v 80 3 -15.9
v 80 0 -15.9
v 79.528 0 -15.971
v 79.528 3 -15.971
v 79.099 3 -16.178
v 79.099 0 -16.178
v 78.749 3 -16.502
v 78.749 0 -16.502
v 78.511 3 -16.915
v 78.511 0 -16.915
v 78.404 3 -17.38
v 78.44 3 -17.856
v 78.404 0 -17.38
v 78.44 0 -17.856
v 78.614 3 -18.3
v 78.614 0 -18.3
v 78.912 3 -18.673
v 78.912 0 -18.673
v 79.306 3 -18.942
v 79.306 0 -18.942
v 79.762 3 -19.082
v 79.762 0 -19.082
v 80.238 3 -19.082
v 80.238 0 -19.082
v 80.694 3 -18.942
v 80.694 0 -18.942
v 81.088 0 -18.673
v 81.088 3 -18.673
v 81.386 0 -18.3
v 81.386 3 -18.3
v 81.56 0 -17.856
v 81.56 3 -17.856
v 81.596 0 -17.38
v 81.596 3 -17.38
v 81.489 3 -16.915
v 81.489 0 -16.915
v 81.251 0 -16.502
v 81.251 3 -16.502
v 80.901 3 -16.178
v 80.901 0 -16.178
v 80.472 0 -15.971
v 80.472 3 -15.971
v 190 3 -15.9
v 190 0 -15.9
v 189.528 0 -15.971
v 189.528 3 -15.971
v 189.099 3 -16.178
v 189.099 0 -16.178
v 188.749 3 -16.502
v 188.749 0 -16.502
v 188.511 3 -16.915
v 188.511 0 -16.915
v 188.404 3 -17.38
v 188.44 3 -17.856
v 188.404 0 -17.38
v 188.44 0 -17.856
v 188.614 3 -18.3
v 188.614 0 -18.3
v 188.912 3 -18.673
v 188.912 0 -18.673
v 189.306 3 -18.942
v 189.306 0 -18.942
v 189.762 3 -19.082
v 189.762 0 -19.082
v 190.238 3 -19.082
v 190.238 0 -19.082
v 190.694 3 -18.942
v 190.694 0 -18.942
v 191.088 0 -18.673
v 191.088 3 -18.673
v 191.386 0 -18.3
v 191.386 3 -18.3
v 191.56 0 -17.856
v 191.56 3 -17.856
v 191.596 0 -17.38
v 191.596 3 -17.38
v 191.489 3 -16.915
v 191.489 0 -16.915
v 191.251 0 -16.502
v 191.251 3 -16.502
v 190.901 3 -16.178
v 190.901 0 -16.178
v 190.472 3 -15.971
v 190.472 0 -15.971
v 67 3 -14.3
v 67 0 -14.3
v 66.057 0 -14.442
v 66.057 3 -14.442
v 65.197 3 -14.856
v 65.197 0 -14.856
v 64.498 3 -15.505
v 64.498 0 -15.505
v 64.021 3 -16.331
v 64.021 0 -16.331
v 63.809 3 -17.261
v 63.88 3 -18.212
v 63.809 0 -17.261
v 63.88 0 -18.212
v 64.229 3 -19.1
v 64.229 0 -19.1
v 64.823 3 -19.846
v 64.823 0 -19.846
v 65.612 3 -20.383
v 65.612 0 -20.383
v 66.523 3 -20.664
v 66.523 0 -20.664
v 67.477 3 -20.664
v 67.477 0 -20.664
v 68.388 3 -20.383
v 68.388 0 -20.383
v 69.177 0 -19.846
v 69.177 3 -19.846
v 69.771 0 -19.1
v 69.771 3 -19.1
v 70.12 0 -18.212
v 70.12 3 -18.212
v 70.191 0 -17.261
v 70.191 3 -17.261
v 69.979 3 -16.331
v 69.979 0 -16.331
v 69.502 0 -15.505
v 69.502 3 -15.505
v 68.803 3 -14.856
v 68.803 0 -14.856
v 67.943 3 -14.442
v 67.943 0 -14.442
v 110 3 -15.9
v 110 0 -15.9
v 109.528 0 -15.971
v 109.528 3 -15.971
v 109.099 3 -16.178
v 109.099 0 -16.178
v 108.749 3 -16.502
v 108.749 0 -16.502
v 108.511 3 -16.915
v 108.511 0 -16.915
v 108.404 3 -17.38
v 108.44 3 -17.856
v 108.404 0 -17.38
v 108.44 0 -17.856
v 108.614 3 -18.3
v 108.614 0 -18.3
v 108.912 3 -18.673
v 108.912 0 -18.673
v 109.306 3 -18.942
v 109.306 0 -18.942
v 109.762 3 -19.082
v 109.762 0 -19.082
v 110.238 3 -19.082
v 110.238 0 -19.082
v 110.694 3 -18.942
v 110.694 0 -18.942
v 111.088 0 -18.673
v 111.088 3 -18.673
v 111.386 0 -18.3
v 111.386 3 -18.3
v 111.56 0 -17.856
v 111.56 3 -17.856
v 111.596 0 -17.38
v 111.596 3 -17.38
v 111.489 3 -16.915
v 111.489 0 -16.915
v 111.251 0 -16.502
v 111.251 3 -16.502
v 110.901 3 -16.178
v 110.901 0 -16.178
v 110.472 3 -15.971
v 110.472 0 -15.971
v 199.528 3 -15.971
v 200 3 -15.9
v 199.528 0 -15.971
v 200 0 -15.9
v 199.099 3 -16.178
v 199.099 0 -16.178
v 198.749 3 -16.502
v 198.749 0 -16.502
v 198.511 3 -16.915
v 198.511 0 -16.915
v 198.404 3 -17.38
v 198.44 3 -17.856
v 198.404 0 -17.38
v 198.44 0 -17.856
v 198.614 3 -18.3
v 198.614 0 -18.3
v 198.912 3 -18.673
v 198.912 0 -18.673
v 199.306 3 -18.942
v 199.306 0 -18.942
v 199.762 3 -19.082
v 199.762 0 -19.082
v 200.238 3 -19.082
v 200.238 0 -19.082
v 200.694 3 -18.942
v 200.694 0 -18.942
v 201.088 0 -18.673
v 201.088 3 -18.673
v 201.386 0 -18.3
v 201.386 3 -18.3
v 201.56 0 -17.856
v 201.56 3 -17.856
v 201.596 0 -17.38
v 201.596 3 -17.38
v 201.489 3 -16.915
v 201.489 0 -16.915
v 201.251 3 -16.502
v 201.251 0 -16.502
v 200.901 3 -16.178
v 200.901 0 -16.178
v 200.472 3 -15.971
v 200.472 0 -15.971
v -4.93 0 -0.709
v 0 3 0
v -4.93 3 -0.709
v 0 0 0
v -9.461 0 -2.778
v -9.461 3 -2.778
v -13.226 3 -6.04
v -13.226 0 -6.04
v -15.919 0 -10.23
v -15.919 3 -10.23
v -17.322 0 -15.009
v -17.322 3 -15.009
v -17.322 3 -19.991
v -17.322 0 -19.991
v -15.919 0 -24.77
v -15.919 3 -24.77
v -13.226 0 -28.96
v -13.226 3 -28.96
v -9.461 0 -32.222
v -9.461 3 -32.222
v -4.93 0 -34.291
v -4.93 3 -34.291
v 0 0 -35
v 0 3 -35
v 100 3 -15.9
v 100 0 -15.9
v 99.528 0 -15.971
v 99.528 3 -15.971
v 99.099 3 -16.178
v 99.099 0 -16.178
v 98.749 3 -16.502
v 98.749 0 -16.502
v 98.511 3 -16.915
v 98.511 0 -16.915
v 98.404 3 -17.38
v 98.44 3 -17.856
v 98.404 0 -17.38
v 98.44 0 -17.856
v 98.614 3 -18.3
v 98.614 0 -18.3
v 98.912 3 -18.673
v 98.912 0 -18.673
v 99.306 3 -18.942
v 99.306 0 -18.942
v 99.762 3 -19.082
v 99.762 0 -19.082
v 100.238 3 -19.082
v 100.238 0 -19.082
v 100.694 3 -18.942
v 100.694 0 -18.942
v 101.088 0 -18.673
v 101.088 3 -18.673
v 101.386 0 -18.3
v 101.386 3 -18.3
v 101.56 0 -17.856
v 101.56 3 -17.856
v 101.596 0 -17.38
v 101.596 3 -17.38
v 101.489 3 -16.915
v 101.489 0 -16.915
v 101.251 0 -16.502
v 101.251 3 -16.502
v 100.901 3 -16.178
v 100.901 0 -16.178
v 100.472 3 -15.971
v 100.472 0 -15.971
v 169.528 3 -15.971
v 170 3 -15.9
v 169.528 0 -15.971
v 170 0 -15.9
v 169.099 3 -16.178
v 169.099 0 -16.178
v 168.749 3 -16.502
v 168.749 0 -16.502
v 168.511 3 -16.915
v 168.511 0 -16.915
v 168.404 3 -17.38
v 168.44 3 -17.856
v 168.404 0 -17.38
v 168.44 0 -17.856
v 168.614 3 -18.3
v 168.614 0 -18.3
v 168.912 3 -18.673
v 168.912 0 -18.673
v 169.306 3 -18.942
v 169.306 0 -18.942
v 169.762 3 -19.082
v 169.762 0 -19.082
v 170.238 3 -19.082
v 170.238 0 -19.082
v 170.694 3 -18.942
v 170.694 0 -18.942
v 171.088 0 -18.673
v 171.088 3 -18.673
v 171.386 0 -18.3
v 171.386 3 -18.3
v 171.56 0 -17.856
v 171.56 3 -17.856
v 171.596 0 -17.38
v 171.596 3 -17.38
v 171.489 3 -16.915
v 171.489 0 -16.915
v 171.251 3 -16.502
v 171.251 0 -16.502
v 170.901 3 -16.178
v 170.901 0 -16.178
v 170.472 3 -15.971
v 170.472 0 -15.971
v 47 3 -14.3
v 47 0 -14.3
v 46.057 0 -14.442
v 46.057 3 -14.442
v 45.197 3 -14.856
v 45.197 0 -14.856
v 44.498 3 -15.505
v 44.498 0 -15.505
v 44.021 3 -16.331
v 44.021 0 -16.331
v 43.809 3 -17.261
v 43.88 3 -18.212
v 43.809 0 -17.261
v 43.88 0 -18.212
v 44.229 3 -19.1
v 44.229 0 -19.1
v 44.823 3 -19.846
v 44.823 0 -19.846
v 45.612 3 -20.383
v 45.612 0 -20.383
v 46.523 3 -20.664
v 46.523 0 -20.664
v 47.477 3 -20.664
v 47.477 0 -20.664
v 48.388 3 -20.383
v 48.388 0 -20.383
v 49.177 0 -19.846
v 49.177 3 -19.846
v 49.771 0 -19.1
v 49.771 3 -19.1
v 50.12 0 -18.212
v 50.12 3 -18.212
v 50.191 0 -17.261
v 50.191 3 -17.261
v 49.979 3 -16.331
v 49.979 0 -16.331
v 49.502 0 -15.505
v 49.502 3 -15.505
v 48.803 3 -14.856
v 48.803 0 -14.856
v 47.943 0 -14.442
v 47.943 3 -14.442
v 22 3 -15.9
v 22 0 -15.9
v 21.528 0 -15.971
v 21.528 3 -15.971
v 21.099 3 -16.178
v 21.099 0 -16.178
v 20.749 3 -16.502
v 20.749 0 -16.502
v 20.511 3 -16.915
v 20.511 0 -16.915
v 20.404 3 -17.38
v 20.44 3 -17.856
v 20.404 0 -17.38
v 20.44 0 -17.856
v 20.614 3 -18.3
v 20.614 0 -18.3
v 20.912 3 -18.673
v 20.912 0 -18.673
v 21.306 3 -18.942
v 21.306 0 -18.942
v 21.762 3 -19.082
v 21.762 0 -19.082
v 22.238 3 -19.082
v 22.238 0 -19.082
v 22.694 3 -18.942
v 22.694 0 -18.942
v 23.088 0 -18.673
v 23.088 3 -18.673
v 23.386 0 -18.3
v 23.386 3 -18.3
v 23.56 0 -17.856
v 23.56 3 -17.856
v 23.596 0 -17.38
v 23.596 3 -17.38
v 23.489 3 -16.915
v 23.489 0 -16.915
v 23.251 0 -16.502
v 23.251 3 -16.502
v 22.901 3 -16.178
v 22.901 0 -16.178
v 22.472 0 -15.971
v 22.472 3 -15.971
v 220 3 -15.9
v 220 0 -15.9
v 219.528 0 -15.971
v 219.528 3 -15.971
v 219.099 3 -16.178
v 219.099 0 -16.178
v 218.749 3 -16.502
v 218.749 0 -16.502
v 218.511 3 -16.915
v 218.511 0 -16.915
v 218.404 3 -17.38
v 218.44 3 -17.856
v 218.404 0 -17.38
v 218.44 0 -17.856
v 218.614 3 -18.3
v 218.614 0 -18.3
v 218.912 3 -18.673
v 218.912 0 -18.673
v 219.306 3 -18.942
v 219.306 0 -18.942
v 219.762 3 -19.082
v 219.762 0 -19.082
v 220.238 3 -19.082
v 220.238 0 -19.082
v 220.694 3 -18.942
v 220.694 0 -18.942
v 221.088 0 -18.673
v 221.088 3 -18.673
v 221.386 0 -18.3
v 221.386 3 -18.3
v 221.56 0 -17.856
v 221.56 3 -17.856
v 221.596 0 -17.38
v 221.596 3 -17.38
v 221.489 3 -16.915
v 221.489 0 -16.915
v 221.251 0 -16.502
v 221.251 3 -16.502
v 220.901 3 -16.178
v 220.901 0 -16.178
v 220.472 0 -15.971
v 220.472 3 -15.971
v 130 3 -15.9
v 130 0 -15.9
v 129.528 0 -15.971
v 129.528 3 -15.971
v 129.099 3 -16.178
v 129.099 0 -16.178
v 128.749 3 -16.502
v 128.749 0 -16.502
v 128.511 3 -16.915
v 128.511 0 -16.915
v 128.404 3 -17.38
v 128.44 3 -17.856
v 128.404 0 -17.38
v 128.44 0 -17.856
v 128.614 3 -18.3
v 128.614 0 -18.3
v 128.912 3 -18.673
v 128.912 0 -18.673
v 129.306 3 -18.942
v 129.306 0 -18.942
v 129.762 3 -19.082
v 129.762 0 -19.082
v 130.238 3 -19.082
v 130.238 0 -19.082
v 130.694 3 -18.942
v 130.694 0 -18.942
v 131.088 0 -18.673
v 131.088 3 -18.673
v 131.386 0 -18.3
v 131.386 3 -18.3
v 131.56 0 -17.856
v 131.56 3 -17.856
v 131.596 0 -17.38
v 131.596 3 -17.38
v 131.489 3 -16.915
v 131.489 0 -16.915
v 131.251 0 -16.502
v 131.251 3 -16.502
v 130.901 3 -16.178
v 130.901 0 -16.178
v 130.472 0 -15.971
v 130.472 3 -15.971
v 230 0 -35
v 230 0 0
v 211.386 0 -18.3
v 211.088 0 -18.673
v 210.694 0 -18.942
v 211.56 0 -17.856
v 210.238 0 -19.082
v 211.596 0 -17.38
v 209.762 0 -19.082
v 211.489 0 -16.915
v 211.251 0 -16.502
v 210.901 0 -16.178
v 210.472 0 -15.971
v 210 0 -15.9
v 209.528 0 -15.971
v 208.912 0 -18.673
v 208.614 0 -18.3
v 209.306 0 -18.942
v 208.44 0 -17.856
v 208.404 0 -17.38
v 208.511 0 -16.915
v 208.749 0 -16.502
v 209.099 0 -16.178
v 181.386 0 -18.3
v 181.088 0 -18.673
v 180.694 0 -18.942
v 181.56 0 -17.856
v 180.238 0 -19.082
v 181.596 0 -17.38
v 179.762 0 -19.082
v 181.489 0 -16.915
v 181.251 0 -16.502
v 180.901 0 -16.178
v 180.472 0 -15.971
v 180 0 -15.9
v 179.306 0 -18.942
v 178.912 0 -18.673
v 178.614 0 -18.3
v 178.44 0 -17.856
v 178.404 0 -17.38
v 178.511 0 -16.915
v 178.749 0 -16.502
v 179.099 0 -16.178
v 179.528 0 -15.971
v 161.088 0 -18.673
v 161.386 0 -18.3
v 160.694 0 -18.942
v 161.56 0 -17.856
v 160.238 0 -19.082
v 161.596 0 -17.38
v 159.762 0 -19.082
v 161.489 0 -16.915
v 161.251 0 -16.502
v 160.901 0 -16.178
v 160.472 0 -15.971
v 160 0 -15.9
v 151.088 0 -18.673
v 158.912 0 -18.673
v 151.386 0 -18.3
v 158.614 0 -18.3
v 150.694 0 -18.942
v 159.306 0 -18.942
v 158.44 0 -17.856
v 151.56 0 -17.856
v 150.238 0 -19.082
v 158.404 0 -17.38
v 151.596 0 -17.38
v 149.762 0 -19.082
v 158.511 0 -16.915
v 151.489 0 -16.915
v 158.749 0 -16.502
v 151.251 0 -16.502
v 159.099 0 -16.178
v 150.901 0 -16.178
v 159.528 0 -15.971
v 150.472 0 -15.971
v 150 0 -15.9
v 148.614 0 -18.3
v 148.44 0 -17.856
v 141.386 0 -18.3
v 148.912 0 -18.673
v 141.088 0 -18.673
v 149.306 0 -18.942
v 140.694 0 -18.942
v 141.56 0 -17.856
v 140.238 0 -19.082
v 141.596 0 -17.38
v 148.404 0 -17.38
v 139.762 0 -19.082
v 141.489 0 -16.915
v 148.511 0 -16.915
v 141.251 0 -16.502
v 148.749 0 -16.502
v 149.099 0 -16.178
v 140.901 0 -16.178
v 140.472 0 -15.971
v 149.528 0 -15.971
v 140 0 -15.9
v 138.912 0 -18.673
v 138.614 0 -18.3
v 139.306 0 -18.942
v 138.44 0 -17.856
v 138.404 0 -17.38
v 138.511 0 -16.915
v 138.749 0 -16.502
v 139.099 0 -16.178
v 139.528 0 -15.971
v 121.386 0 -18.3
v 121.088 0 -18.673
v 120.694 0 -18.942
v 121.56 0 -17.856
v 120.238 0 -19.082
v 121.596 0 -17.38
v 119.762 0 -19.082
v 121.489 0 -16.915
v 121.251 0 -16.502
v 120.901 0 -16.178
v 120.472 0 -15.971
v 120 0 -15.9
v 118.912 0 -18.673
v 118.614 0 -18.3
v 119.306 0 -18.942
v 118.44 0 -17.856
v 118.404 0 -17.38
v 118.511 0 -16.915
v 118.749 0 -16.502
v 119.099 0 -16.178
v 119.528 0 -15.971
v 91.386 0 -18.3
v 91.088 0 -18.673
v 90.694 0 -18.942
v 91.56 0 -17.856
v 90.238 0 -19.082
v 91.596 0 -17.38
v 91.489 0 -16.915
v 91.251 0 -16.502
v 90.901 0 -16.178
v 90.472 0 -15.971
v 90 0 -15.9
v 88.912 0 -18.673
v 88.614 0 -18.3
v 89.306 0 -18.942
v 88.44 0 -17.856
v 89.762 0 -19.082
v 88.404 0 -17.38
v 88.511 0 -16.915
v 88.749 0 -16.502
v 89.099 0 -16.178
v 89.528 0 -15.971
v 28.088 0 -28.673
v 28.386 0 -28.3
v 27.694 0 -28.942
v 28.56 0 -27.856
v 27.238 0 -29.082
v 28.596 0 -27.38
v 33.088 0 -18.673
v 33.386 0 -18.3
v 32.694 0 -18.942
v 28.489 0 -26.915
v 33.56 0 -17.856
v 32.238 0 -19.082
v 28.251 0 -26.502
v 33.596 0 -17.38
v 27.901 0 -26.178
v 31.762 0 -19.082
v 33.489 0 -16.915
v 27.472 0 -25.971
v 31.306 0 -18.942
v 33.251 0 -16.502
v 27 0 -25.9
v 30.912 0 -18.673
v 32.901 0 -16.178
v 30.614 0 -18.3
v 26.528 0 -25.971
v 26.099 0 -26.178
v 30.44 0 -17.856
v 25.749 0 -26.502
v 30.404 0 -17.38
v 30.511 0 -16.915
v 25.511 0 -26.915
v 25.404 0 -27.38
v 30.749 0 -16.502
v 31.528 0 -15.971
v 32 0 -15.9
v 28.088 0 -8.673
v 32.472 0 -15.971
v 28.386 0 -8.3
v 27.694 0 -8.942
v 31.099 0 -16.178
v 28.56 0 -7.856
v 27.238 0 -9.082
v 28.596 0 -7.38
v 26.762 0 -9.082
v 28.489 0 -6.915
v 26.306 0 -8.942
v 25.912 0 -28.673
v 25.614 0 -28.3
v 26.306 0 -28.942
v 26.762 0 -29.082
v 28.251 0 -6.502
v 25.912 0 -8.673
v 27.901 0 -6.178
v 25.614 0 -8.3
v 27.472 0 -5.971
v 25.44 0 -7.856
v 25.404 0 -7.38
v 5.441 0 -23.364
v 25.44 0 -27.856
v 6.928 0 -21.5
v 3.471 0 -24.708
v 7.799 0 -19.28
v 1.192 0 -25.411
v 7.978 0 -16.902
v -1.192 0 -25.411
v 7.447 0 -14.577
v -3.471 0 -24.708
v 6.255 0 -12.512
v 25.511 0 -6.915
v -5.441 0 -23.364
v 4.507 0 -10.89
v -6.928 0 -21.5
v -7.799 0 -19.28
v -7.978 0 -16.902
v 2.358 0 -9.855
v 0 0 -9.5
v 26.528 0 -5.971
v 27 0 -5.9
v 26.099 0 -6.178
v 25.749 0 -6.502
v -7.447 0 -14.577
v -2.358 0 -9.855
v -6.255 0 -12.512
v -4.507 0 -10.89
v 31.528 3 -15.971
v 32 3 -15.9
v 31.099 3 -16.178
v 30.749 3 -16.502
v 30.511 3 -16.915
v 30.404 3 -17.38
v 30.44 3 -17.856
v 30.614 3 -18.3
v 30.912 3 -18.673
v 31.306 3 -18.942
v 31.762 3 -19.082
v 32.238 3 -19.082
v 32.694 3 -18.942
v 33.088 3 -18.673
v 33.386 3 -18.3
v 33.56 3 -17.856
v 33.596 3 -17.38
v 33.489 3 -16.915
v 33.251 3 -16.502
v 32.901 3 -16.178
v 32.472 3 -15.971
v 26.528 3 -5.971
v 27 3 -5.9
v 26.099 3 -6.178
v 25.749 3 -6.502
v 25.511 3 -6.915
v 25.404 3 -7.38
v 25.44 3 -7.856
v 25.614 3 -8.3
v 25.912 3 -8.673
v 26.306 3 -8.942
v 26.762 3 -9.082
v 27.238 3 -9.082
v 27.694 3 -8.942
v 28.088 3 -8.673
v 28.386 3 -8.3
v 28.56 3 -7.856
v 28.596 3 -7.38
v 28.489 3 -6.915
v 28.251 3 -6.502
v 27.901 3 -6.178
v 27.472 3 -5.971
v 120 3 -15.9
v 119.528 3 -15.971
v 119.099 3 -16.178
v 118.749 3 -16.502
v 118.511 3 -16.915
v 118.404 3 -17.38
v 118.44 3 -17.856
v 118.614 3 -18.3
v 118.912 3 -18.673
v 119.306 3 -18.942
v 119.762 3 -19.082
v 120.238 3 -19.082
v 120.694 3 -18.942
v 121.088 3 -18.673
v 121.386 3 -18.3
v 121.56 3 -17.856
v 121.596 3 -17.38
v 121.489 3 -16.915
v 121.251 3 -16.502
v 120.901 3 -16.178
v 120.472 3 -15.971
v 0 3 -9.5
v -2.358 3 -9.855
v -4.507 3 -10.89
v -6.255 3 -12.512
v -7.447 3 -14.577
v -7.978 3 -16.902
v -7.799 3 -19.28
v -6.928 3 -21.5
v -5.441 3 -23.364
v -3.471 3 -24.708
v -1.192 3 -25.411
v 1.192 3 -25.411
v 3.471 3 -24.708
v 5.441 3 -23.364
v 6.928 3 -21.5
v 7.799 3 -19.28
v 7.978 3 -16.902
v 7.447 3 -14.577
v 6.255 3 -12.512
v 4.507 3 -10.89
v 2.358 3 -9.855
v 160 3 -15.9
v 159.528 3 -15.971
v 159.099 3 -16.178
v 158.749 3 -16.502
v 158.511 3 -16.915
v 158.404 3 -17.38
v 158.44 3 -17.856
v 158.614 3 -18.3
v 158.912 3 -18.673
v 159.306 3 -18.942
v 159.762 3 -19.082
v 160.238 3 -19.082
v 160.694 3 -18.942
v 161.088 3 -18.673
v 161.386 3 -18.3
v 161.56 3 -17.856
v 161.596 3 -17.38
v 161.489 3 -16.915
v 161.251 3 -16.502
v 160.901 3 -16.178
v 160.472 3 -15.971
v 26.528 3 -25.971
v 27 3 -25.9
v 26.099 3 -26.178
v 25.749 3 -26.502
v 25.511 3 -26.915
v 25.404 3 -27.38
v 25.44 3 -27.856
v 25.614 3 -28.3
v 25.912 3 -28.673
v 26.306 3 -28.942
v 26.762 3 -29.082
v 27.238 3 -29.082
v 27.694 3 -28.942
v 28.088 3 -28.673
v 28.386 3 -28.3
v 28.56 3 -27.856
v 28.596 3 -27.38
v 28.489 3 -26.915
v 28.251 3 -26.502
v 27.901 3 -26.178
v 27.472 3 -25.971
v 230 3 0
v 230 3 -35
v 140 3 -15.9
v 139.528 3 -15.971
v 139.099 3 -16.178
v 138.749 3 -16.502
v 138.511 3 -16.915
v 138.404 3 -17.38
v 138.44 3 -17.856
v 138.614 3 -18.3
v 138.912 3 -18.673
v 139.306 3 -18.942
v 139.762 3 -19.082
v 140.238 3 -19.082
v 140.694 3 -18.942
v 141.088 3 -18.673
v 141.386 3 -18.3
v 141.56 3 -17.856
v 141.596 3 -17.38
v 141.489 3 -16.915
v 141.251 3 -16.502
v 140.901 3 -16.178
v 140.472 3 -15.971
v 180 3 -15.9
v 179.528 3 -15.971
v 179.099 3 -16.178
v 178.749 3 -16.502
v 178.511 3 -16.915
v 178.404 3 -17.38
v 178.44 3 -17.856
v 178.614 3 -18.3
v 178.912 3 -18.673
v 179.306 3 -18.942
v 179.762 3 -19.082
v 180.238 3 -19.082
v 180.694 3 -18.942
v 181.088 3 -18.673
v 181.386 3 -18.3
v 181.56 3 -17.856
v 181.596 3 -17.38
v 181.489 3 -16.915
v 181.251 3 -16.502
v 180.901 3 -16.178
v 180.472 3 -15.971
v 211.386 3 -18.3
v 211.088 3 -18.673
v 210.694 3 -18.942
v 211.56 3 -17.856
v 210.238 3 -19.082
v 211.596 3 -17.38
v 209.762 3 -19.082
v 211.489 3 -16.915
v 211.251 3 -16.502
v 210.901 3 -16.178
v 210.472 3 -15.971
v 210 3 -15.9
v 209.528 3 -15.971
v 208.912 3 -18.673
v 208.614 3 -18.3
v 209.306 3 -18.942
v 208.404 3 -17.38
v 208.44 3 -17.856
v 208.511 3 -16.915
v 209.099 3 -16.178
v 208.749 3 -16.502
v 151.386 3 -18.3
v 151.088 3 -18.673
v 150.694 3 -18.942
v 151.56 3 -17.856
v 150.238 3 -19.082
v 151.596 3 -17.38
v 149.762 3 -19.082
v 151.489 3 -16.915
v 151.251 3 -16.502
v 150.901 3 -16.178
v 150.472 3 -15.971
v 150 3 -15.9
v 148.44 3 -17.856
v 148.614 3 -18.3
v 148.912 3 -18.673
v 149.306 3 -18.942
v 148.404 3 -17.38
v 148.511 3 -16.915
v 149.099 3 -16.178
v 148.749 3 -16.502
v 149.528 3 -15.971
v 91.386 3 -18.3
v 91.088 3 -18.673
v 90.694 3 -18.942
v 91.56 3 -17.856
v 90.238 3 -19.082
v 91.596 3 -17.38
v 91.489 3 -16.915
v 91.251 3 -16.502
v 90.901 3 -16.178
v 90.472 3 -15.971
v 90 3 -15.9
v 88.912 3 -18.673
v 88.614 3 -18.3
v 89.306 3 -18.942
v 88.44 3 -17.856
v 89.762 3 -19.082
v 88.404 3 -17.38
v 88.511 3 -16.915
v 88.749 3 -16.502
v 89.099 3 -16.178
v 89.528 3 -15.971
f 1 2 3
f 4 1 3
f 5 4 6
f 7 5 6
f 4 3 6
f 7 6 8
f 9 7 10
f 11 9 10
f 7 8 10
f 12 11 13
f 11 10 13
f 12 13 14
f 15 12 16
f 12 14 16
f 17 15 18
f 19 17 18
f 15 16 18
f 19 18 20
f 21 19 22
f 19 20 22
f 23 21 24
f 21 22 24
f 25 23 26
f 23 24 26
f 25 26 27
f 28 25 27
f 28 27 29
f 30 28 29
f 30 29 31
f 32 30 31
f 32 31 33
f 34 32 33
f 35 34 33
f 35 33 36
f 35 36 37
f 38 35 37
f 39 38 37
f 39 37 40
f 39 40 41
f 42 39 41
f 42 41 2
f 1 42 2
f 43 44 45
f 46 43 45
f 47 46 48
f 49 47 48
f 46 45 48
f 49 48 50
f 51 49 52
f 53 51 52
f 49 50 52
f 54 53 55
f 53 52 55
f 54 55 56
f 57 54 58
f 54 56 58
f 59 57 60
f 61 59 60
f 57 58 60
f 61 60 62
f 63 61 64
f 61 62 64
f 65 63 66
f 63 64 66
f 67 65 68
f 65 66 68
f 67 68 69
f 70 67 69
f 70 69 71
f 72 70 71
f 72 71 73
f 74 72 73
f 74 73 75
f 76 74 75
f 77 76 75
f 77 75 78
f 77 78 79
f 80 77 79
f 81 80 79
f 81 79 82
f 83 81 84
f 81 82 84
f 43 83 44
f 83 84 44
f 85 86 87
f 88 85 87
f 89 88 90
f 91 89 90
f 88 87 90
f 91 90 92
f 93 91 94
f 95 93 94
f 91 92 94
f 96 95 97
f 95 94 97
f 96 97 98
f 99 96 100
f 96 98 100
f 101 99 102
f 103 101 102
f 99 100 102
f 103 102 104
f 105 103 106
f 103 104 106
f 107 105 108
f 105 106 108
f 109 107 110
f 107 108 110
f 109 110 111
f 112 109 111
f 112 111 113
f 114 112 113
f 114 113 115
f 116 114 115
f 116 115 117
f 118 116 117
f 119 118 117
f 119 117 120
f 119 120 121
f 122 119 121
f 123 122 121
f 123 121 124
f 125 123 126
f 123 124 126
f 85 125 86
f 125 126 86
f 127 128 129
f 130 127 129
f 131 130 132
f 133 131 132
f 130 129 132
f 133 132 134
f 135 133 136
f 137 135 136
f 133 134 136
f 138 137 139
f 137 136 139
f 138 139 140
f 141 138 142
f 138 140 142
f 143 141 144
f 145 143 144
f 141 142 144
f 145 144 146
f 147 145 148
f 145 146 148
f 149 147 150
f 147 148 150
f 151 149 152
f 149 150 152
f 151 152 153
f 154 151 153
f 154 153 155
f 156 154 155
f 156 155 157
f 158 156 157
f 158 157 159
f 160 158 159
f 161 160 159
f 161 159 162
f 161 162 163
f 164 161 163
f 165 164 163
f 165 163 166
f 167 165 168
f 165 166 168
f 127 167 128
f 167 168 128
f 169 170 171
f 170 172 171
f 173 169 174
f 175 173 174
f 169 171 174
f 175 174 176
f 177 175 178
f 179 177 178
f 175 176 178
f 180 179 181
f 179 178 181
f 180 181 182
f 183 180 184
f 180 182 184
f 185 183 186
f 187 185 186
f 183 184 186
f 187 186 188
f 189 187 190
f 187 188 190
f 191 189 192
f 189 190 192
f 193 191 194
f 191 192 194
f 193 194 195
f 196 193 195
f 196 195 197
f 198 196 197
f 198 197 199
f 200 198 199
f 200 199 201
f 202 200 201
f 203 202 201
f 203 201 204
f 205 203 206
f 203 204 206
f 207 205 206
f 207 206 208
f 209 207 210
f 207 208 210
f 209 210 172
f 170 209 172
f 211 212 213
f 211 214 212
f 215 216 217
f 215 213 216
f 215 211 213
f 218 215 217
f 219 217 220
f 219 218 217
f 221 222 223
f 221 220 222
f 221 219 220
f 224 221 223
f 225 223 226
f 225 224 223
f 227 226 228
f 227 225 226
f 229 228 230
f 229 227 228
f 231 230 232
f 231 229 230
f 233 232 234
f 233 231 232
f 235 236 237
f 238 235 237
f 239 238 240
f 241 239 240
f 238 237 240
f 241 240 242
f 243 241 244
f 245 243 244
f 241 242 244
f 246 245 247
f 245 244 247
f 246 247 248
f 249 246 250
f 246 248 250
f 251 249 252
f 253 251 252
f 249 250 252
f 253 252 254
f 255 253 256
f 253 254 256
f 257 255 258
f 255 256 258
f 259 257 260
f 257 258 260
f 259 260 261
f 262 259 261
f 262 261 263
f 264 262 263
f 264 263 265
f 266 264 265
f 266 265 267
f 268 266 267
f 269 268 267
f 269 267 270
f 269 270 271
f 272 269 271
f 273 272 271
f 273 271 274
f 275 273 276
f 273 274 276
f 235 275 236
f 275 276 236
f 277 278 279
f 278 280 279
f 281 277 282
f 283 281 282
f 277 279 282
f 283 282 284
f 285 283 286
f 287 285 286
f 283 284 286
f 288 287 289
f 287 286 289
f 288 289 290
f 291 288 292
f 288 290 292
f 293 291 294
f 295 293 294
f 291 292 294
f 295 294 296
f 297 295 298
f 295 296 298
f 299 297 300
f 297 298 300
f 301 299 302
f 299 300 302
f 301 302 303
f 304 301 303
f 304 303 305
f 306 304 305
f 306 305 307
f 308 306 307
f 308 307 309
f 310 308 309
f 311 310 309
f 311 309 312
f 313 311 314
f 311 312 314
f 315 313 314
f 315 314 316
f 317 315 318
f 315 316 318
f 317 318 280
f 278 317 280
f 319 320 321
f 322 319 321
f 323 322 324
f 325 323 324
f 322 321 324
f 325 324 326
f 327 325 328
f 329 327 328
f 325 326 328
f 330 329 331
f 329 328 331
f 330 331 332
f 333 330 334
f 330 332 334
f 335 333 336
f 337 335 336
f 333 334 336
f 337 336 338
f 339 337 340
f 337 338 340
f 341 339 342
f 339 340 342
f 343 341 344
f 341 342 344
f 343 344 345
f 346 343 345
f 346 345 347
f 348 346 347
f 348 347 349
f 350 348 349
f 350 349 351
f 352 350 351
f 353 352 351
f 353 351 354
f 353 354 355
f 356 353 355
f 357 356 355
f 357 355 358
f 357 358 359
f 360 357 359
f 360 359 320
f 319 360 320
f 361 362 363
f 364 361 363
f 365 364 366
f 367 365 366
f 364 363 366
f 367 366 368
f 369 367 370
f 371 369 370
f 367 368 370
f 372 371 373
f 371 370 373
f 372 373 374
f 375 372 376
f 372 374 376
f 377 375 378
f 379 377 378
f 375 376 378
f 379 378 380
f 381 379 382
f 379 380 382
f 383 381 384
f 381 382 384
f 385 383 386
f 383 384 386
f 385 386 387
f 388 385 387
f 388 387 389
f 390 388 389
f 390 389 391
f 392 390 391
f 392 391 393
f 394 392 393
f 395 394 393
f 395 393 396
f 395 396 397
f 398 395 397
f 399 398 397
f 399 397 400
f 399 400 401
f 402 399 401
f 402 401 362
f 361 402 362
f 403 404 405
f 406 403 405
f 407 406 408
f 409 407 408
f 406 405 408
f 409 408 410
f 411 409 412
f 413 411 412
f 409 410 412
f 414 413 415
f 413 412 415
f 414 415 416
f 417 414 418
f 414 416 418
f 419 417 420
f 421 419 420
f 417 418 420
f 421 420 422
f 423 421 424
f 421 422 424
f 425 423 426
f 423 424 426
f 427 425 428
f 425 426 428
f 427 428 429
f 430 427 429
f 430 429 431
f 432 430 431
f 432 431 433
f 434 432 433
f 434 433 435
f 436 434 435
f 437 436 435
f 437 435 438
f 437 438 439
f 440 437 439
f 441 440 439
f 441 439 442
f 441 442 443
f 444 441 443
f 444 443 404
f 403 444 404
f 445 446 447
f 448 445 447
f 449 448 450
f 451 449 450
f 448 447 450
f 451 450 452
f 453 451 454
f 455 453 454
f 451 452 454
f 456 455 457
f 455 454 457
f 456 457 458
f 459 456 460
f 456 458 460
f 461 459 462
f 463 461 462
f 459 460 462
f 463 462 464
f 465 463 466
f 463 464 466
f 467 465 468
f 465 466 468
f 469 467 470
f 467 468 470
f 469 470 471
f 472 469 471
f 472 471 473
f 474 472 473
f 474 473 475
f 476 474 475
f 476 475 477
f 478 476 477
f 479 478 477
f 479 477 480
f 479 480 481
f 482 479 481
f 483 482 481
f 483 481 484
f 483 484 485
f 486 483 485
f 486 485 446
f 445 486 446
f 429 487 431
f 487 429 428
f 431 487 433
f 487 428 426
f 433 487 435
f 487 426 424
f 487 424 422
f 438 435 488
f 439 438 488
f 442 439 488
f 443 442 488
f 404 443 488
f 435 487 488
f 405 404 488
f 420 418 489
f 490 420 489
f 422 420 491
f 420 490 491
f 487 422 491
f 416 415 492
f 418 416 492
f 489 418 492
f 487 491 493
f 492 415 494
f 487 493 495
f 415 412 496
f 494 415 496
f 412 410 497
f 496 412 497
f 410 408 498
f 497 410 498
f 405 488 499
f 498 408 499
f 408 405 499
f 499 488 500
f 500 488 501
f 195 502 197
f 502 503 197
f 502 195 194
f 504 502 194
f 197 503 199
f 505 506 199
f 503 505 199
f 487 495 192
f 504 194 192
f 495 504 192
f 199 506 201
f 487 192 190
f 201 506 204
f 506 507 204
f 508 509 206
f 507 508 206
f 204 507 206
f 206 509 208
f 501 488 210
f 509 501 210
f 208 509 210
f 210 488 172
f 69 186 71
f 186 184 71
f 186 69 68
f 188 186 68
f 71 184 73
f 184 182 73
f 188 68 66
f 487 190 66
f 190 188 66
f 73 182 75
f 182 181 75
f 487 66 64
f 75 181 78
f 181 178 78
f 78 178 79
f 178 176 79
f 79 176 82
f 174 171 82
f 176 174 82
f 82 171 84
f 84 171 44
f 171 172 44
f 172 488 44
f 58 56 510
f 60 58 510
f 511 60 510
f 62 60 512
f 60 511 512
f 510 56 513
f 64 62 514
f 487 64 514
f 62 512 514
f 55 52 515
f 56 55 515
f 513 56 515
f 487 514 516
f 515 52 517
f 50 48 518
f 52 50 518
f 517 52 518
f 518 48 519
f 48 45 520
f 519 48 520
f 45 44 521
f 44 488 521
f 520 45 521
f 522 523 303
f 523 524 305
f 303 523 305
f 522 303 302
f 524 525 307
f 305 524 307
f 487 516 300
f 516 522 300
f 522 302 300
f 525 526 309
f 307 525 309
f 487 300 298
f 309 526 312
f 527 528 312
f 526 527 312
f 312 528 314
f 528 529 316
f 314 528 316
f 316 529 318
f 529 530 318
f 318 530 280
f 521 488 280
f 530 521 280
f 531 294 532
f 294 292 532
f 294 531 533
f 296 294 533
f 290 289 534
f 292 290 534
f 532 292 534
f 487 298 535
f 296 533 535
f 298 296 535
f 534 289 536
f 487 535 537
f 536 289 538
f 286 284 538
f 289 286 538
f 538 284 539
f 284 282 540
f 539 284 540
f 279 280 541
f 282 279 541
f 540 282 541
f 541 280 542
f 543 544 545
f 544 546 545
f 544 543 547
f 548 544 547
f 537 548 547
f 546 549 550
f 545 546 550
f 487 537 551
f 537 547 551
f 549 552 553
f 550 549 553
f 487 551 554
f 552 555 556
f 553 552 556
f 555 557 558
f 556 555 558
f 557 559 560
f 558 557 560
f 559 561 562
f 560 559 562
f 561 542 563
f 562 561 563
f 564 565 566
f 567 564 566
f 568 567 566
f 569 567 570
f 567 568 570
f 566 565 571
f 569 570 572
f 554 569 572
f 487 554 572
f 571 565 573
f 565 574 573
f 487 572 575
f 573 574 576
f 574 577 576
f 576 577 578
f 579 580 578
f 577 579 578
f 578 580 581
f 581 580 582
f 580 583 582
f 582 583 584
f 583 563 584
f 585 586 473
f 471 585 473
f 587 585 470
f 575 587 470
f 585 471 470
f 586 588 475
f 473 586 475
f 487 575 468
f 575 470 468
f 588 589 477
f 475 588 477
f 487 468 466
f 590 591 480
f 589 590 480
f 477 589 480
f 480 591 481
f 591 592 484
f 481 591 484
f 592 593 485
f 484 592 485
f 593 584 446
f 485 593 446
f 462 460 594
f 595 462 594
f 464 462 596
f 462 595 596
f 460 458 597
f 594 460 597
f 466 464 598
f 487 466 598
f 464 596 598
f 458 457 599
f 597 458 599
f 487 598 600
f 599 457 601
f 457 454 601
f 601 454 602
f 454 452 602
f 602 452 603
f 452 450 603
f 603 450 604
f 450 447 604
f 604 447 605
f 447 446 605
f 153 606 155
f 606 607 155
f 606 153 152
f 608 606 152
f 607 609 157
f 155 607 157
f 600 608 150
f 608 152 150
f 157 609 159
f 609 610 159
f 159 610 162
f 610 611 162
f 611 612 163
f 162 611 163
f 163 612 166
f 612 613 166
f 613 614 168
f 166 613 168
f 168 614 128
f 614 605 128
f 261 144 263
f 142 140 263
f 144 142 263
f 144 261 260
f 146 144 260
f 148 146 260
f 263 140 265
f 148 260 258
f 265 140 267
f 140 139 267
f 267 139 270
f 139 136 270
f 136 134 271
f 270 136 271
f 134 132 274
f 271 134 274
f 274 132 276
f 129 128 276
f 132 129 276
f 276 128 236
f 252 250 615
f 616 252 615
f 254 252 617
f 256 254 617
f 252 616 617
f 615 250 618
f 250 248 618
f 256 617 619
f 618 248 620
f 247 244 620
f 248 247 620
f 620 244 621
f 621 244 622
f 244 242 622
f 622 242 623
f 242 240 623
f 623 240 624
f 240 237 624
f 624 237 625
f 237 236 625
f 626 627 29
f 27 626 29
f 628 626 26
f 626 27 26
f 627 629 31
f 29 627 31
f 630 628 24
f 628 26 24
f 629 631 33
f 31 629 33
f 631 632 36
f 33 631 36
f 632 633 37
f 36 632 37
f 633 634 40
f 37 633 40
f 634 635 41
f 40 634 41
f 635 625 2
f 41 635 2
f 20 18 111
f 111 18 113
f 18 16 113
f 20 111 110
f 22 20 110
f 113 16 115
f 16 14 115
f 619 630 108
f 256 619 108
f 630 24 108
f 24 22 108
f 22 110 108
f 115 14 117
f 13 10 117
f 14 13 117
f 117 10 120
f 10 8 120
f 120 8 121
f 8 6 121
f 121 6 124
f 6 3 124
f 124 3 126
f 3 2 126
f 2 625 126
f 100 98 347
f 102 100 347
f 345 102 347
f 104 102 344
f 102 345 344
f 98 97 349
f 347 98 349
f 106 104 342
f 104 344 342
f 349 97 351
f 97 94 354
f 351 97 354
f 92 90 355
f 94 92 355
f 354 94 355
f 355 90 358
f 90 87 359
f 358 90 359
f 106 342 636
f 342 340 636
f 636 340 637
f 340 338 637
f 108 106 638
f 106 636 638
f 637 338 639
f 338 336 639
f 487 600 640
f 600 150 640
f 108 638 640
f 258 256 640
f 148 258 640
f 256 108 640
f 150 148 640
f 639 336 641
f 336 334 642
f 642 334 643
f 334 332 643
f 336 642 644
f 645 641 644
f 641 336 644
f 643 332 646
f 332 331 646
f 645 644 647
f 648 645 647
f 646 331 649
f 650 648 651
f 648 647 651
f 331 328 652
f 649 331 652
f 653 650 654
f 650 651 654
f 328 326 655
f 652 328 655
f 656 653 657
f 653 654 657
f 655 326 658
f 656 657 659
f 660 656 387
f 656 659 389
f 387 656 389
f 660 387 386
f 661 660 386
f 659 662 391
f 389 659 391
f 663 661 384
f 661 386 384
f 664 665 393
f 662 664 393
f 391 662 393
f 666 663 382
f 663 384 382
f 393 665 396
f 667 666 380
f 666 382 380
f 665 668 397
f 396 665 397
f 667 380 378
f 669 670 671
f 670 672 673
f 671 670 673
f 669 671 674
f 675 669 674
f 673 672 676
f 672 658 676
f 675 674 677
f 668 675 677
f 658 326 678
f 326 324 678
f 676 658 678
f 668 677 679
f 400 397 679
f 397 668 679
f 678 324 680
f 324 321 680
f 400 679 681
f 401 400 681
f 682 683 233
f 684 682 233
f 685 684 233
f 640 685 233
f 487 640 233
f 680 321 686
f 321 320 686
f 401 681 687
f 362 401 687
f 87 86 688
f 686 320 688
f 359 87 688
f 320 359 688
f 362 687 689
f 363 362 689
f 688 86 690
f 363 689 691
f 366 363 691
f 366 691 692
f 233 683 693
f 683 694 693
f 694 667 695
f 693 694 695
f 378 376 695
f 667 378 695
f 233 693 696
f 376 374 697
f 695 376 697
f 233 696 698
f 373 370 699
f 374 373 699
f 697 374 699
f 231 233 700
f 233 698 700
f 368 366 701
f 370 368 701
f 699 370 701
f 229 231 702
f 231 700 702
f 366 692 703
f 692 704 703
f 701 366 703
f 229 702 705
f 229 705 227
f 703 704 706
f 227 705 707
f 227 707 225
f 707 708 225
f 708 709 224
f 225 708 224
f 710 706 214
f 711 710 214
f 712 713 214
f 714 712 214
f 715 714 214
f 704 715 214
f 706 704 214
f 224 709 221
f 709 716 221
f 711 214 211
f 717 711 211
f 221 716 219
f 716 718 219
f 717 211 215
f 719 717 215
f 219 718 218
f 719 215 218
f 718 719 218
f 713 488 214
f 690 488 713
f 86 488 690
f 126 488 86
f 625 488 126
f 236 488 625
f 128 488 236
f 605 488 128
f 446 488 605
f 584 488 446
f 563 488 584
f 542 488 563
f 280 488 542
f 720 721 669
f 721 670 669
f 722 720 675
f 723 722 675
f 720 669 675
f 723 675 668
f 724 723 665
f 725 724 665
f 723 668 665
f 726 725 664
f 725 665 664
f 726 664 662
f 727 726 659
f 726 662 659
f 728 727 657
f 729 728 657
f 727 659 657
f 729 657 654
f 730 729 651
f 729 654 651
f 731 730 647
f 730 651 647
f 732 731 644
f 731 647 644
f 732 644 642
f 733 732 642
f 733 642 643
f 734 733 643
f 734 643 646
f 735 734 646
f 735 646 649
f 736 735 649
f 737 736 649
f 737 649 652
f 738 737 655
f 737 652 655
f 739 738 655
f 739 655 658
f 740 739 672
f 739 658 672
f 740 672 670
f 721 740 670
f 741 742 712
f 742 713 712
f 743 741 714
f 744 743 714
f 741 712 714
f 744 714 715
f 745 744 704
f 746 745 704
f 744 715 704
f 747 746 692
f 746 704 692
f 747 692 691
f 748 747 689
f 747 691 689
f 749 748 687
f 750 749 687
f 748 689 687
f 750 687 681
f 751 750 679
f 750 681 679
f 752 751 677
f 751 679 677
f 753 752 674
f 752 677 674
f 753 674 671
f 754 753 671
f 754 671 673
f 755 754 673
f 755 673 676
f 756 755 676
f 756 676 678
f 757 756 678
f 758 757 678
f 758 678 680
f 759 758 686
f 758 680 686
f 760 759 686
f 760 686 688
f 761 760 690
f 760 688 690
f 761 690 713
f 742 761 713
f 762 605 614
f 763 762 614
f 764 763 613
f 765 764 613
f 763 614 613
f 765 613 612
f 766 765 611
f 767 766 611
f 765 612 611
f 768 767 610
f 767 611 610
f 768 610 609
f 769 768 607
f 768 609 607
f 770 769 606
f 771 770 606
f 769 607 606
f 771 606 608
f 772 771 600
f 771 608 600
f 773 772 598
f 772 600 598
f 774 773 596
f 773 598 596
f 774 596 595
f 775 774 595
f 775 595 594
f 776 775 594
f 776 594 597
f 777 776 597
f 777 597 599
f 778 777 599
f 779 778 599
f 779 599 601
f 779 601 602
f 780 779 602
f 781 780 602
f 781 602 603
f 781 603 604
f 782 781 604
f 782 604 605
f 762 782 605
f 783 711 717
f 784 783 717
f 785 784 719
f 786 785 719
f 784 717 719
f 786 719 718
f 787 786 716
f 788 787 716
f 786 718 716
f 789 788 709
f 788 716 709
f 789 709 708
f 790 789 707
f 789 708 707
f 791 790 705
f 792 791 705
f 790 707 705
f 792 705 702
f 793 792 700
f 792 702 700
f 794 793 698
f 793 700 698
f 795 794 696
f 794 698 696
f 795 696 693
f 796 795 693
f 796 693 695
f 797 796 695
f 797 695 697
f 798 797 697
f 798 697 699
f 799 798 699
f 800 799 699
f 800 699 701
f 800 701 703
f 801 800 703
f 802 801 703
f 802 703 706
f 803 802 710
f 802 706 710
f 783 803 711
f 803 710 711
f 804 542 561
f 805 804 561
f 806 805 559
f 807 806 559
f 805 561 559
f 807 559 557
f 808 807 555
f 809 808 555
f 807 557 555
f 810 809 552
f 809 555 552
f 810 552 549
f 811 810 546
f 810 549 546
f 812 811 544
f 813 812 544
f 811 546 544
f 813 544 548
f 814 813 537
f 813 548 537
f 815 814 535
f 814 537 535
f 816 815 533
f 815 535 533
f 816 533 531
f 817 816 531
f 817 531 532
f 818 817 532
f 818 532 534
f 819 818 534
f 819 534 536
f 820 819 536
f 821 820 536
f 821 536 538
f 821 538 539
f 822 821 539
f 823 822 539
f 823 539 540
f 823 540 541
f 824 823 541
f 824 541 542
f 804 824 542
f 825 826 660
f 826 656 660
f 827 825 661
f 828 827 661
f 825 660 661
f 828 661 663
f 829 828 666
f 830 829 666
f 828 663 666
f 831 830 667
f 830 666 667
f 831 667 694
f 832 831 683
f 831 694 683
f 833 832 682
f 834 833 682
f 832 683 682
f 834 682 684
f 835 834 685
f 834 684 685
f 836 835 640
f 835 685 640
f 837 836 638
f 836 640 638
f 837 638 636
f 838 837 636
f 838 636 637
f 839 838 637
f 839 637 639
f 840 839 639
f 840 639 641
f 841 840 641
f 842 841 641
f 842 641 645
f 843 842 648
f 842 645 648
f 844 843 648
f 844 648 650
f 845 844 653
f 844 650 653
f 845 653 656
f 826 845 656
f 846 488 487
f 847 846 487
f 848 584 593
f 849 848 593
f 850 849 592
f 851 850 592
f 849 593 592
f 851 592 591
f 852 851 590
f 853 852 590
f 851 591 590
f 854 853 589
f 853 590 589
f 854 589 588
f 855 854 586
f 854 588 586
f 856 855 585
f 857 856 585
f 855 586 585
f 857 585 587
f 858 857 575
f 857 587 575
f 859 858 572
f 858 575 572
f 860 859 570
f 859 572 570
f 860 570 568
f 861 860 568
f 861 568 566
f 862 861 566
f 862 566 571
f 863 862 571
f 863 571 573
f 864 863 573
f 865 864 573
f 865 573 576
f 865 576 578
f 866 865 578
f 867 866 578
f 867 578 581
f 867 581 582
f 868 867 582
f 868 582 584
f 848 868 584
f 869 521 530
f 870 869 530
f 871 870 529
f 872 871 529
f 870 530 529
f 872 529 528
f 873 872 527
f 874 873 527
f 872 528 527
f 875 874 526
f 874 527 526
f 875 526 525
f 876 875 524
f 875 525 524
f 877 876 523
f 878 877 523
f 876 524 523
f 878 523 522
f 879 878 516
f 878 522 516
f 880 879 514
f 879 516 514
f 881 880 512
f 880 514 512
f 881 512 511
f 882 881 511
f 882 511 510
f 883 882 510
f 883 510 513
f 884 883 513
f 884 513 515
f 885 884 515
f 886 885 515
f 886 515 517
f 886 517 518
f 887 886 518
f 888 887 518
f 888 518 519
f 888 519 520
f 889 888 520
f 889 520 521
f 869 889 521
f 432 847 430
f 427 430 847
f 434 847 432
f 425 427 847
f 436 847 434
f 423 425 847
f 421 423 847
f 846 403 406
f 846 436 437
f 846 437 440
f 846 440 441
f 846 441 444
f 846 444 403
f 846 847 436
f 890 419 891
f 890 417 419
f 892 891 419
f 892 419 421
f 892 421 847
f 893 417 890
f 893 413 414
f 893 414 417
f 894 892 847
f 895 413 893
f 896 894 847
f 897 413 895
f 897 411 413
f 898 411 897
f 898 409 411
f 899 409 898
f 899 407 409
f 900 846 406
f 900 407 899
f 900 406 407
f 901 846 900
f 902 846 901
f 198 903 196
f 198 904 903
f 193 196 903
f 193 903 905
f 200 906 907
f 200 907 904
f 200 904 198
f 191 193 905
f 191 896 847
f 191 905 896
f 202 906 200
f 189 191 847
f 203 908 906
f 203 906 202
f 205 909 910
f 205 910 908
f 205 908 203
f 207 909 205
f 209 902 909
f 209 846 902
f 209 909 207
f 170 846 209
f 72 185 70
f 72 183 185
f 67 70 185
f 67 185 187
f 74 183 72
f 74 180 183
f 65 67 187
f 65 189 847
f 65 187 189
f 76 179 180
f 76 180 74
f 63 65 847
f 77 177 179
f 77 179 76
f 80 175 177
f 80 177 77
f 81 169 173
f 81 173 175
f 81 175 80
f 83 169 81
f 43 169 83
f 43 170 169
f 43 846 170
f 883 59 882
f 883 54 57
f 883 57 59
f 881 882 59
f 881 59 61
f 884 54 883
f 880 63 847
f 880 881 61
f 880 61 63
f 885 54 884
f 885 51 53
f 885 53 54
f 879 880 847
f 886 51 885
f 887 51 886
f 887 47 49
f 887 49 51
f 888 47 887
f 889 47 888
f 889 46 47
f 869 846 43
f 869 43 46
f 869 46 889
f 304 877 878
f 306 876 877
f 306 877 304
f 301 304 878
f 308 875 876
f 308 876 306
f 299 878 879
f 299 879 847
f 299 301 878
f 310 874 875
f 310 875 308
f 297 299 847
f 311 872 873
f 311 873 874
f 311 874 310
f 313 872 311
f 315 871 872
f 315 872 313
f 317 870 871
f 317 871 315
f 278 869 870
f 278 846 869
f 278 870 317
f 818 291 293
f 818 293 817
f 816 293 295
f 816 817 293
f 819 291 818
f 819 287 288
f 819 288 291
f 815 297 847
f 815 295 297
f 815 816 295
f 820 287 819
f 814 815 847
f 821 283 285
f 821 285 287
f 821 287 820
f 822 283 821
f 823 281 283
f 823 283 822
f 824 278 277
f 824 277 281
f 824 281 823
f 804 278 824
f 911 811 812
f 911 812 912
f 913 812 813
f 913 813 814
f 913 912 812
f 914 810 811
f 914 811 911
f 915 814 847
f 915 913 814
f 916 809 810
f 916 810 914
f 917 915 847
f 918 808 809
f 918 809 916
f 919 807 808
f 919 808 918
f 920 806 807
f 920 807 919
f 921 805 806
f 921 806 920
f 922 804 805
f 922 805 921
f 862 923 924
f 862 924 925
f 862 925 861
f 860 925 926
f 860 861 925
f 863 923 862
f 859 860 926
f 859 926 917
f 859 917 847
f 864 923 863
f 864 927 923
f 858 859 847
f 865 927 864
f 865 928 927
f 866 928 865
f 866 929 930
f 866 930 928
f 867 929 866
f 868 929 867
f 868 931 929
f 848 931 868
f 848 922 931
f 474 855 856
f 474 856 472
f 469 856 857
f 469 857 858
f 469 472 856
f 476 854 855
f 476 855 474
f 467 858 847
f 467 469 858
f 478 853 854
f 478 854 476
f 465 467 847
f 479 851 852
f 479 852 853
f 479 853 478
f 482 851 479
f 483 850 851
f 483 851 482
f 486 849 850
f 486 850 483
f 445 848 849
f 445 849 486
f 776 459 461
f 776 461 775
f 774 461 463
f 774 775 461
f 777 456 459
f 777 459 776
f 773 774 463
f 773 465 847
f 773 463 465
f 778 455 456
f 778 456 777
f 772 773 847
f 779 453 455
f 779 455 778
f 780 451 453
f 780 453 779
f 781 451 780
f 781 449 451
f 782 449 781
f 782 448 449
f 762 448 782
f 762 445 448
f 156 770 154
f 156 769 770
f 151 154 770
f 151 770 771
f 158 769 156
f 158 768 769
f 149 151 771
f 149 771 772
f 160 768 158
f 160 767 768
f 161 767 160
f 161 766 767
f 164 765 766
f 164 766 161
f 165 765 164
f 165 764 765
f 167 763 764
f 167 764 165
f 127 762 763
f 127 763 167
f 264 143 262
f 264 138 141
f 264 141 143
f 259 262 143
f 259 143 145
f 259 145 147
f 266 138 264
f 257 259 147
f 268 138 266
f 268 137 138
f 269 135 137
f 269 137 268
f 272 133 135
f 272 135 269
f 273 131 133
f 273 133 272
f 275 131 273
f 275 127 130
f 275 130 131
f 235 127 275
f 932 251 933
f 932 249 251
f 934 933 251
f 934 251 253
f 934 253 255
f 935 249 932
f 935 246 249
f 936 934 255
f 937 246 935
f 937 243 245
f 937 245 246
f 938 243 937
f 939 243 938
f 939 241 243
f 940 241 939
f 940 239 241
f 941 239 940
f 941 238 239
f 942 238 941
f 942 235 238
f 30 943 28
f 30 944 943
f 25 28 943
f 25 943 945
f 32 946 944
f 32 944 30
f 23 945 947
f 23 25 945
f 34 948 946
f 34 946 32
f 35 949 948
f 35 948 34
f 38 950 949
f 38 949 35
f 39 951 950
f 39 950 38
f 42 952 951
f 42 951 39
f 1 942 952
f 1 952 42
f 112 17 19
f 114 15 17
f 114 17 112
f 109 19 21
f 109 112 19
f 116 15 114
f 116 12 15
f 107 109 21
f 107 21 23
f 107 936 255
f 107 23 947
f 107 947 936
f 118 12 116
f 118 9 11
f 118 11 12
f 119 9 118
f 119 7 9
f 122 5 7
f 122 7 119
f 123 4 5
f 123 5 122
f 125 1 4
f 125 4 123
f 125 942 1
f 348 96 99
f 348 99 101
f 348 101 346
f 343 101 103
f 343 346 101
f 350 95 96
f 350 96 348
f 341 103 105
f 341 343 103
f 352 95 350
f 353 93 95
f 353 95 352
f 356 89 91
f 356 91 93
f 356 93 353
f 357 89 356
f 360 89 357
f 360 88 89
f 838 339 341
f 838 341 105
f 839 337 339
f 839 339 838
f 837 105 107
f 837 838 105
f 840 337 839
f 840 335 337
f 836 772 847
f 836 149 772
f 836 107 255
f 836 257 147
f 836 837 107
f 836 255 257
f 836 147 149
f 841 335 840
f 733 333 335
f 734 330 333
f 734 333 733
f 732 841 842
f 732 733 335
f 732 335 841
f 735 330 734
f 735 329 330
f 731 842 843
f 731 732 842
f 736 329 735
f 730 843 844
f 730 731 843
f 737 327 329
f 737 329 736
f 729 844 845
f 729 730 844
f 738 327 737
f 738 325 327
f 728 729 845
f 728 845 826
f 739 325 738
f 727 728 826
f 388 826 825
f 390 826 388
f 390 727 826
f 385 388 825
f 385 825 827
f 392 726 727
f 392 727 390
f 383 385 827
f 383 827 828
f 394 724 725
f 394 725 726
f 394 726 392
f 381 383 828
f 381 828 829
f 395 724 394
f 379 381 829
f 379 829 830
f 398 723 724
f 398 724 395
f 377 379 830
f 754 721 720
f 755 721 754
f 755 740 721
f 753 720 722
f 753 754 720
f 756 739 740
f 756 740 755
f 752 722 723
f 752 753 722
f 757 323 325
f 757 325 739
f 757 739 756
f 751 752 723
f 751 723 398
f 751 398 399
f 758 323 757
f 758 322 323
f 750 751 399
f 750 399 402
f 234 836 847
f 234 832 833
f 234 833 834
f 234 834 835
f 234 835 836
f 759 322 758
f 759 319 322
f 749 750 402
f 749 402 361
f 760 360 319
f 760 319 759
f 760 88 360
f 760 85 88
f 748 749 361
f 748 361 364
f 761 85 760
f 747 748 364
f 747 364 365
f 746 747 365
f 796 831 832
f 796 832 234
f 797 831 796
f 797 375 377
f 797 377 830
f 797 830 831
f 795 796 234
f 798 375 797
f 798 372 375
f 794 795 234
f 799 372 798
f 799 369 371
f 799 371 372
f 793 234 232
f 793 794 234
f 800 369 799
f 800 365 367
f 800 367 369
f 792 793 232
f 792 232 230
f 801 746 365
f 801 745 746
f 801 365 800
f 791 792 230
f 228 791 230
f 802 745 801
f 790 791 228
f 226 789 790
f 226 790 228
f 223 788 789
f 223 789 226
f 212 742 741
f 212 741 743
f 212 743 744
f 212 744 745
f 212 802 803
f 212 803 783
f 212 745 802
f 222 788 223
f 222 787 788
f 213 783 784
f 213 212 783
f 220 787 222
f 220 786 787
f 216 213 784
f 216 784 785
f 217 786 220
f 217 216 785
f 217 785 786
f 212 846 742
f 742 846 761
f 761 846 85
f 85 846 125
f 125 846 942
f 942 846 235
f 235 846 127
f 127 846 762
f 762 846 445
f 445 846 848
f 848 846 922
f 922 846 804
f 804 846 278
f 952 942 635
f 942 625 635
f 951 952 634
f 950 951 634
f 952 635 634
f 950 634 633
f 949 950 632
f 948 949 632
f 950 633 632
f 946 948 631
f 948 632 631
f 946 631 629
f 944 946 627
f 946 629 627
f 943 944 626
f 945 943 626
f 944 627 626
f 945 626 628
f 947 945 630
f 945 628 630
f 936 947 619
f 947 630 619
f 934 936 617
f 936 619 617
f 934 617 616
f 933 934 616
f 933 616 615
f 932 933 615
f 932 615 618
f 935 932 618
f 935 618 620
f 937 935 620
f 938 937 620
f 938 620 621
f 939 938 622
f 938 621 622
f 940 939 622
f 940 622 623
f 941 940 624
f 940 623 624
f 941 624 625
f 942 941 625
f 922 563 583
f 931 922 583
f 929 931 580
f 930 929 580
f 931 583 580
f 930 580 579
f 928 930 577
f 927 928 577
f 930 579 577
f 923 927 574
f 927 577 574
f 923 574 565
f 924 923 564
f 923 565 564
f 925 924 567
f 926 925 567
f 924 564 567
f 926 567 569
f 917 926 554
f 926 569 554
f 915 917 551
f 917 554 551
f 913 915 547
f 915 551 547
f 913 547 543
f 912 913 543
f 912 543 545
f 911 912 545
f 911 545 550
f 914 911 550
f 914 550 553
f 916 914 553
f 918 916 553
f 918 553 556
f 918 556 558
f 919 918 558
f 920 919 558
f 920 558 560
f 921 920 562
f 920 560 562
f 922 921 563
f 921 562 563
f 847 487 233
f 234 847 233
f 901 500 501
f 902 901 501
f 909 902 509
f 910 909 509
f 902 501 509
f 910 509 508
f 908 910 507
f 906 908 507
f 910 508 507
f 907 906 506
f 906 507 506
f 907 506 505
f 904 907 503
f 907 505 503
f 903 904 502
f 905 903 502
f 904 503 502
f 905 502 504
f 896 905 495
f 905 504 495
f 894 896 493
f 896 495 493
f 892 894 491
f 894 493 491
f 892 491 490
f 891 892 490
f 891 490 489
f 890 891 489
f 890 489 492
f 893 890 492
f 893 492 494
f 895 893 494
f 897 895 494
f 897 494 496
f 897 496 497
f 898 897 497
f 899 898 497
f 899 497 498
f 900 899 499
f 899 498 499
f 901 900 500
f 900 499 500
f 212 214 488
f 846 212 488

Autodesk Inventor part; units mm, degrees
ref_plane "YZ Plane" through (0, 0, 0) normal (1, 0, 0) x (0, 1, 0)
ref_plane "XZ Plane" through (0, 0, 0) normal (0, 1, 0) x (-1, 0, 0)
ref_plane "XY Plane" through (0, 0, 0) normal (0, 0, 1) x (1, 0, 0)
sketch "スケッチ1" plane through (0, 0, 0) normal (0, 1, 0) x (-1, 0, 0)
  line L0 (0, 0) -> (-230, 0)
  line L1 (-230, 0) -> (-230, -35)
  line L2 (-230, -35) -> (0, -35)
  line L3 (0, -35) -> (0, 0)
  arc A0 (0, -35) -> (0, 0) centre (0, -17.5) ccw
  dimension "d0" = 230
  dimension "d1" = 35
  dimension "d2" = 17.5
extrude "押し出し1" add sketch "スケッチ1" along normal blind 3
sketch "スケッチ2" plane through (0, 3, 0) normal (0, 1, 0) x (1, 0, 0)
  line L0 (0, 17.5) -> (238.6526, 17.5)
  line L1 (0, 0) -> (230, 0) projected
  arc A0 (0, 35) -> (0, 0) centre (0, 17.5) ccw projected
  point P0 (90, 17.5)
  point P1 (100, 17.5)
  point P2 (110, 17.5)
  point P3 (120, 17.5)
  point P4 (130, 17.5)
  point P5 (140, 17.5)
  point P6 (150, 17.5)
  point P7 (160, 17.5)
  point P8 (170, 17.5)
  point P9 (180, 17.5)
  point P10 (190, 17.5)
  point P11 (200, 17.5)
  point P12 (210, 17.5)
  point P13 (-17.5, 17.5)
  point P14 (220, 17.5)
  point P15 (80, 17.5)
  dimension "d5" = 17.5
  dimension "d13" = 10
  dimension "d14" = 10
  dimension "d15" = 10
  dimension "d16" = 10
  dimension "d17" = 10
  dimension "d18" = 10
  dimension "d19" = 10
  dimension "d20" = 10
  dimension "d21" = 10
  dimension "d22" = 10
  dimension "d23" = 10
  dimension "d24" = 10
  dimension "d35" = 17.5
  dimension "d67" = 10
  dimension "d78" = 10
  dimension "d96" = 80
hole "穴1" at (90, 3, -17.5) at (100, 3, -17.5) at (110, 3, -17.5) at (120, 3, -17.5) at (130, 3, -17.5) at (140, 3, -17.5) at (150, 3, -17.5) at (160, 3, -17.5) at (170, 3, -17.5) at (180, 3, -17.5) at (190, 3, -17.5) at (200, 3, -17.5) at (210, 3, -17.5) at (220, 3, -17.5) at (80, 3, -17.5) direction (0, -1, 0) diameter 3.2 end through all
sketch "スケッチ3" plane through (0, 3, 0) normal (0, 1, 0) x (1, 0, 0)
  line L0 (230, 35) -> (0, 35) projected
  point P0 (0, 0)
  point P1 (0, 17.5)
  dimension "d36" = 17.5
hole "穴2" at (0, 3, -17.5) direction (0, -1, 0) diameter 16 end through all
sketch "スケッチ4" plane through (0, 3, 0) normal (0, 1, 0) x (1, 0, 0)
  circle A0 centre (0, 17.5) radius 6
  circle A1 centre (0, 17.5) radius 8 projected
  line L0 (-0.1439, 17.5) -> (-6.5454, 17.5)
  line L1 (-6.5454, 17.5) -> (7.5104, 17.5)
  point P0 (0, 0)
  point P1 (0, 11.5)
  point P2 (6, 17.5)
  point P3 (0, 23.5)
  point P4 (-6, 17.5)
  dimension "d44" = 12
  dimension "d45" = 0
hole "穴3" [suppressed]
sketch "スケッチ5" plane through (0, 3, 0) normal (0, 1, 0) x (1, 0, 0)
  circle A0 centre (0, 17.5) radius 8 projected
  point P0 (0, 0)
  point P1 (15.8, 7)
  point P2 (15.8, 28)
  point P3 (24.9999, 17.5)
  dimension "d53" = 10.5
  dimension "d55" = 15.8
  dimension "d56" = 15.8
  dimension "d83" = 10.5
hole "穴4" [suppressed]
sketch "スケッチ6" plane through (0, 3, 0) normal (0, 1, 0) x (1, 0, 0)
  circle A0 centre (0, 17.5) radius 8 construction
  line L0 (0, 17.5) -> (230, 17.5) construction
  line L1 (230, 0) -> (230, 35) construction
  point P0 (0, 0)
  point P1 (67, 17.5)
  point P2 (47, 17.5)
  dimension "d69" = 47
  dimension "d70" = 20
hole "穴5" at (67, 3, -17.5) at (47, 3, -17.5) direction (0, -1, 0) diameter 6.4 end through all
sketch "スケッチ7" plane through (0, 3, 0) normal (0, 1, 0) x (1, 0, 0)
  circle A0 centre (0, 17.5) radius 8 construction
  circle A1 centre (0, 17.5) radius 12.5 construction
  point P0 (0, 0)
  point P1 (0, 5)
  point P2 (12.5, 17.5)
  point P3 (0, 30)
  point P4 (-12.5, 17.5)
  dimension "d84" = 25
  dimension "d87" = 360
hole "穴6" [suppressed]
sketch "スケッチ8" plane through (0, 3, 0) normal (0, 1, 0) x (1, 0, 0)
  line L0 (230, 0) -> (230, 35) construction
  line L1 (230, 17.5) -> (-17.5, 17.5) construction
  arc A0 (0, 35) -> (0, 0) centre (0, 17.5) ccw construction
  circle A1 centre (47, 17.5) radius 3.2 construction
  line L2 (27, 0) -> (27, 35) construction
  point P0 (32, 17.5)
  point P1 (22, 17.5)
  point P2 (27, 7.5)
  point P3 (27, 27.5)
  dimension "d97" = 15
  dimension "d98" = 10
  dimension "d106" = 5
  dimension "d107" = 10
  dimension "d108" = 10
hole "穴7" at (32, 3, -17.5) at (22, 3, -17.5) at (27, 3, -7.5) at (27, 3, -27.5) direction (0, -1, 0) diameter 3.2 end through all
properties part number "shoulder2_lower_right_plate" material "アルミニウム 5052"
